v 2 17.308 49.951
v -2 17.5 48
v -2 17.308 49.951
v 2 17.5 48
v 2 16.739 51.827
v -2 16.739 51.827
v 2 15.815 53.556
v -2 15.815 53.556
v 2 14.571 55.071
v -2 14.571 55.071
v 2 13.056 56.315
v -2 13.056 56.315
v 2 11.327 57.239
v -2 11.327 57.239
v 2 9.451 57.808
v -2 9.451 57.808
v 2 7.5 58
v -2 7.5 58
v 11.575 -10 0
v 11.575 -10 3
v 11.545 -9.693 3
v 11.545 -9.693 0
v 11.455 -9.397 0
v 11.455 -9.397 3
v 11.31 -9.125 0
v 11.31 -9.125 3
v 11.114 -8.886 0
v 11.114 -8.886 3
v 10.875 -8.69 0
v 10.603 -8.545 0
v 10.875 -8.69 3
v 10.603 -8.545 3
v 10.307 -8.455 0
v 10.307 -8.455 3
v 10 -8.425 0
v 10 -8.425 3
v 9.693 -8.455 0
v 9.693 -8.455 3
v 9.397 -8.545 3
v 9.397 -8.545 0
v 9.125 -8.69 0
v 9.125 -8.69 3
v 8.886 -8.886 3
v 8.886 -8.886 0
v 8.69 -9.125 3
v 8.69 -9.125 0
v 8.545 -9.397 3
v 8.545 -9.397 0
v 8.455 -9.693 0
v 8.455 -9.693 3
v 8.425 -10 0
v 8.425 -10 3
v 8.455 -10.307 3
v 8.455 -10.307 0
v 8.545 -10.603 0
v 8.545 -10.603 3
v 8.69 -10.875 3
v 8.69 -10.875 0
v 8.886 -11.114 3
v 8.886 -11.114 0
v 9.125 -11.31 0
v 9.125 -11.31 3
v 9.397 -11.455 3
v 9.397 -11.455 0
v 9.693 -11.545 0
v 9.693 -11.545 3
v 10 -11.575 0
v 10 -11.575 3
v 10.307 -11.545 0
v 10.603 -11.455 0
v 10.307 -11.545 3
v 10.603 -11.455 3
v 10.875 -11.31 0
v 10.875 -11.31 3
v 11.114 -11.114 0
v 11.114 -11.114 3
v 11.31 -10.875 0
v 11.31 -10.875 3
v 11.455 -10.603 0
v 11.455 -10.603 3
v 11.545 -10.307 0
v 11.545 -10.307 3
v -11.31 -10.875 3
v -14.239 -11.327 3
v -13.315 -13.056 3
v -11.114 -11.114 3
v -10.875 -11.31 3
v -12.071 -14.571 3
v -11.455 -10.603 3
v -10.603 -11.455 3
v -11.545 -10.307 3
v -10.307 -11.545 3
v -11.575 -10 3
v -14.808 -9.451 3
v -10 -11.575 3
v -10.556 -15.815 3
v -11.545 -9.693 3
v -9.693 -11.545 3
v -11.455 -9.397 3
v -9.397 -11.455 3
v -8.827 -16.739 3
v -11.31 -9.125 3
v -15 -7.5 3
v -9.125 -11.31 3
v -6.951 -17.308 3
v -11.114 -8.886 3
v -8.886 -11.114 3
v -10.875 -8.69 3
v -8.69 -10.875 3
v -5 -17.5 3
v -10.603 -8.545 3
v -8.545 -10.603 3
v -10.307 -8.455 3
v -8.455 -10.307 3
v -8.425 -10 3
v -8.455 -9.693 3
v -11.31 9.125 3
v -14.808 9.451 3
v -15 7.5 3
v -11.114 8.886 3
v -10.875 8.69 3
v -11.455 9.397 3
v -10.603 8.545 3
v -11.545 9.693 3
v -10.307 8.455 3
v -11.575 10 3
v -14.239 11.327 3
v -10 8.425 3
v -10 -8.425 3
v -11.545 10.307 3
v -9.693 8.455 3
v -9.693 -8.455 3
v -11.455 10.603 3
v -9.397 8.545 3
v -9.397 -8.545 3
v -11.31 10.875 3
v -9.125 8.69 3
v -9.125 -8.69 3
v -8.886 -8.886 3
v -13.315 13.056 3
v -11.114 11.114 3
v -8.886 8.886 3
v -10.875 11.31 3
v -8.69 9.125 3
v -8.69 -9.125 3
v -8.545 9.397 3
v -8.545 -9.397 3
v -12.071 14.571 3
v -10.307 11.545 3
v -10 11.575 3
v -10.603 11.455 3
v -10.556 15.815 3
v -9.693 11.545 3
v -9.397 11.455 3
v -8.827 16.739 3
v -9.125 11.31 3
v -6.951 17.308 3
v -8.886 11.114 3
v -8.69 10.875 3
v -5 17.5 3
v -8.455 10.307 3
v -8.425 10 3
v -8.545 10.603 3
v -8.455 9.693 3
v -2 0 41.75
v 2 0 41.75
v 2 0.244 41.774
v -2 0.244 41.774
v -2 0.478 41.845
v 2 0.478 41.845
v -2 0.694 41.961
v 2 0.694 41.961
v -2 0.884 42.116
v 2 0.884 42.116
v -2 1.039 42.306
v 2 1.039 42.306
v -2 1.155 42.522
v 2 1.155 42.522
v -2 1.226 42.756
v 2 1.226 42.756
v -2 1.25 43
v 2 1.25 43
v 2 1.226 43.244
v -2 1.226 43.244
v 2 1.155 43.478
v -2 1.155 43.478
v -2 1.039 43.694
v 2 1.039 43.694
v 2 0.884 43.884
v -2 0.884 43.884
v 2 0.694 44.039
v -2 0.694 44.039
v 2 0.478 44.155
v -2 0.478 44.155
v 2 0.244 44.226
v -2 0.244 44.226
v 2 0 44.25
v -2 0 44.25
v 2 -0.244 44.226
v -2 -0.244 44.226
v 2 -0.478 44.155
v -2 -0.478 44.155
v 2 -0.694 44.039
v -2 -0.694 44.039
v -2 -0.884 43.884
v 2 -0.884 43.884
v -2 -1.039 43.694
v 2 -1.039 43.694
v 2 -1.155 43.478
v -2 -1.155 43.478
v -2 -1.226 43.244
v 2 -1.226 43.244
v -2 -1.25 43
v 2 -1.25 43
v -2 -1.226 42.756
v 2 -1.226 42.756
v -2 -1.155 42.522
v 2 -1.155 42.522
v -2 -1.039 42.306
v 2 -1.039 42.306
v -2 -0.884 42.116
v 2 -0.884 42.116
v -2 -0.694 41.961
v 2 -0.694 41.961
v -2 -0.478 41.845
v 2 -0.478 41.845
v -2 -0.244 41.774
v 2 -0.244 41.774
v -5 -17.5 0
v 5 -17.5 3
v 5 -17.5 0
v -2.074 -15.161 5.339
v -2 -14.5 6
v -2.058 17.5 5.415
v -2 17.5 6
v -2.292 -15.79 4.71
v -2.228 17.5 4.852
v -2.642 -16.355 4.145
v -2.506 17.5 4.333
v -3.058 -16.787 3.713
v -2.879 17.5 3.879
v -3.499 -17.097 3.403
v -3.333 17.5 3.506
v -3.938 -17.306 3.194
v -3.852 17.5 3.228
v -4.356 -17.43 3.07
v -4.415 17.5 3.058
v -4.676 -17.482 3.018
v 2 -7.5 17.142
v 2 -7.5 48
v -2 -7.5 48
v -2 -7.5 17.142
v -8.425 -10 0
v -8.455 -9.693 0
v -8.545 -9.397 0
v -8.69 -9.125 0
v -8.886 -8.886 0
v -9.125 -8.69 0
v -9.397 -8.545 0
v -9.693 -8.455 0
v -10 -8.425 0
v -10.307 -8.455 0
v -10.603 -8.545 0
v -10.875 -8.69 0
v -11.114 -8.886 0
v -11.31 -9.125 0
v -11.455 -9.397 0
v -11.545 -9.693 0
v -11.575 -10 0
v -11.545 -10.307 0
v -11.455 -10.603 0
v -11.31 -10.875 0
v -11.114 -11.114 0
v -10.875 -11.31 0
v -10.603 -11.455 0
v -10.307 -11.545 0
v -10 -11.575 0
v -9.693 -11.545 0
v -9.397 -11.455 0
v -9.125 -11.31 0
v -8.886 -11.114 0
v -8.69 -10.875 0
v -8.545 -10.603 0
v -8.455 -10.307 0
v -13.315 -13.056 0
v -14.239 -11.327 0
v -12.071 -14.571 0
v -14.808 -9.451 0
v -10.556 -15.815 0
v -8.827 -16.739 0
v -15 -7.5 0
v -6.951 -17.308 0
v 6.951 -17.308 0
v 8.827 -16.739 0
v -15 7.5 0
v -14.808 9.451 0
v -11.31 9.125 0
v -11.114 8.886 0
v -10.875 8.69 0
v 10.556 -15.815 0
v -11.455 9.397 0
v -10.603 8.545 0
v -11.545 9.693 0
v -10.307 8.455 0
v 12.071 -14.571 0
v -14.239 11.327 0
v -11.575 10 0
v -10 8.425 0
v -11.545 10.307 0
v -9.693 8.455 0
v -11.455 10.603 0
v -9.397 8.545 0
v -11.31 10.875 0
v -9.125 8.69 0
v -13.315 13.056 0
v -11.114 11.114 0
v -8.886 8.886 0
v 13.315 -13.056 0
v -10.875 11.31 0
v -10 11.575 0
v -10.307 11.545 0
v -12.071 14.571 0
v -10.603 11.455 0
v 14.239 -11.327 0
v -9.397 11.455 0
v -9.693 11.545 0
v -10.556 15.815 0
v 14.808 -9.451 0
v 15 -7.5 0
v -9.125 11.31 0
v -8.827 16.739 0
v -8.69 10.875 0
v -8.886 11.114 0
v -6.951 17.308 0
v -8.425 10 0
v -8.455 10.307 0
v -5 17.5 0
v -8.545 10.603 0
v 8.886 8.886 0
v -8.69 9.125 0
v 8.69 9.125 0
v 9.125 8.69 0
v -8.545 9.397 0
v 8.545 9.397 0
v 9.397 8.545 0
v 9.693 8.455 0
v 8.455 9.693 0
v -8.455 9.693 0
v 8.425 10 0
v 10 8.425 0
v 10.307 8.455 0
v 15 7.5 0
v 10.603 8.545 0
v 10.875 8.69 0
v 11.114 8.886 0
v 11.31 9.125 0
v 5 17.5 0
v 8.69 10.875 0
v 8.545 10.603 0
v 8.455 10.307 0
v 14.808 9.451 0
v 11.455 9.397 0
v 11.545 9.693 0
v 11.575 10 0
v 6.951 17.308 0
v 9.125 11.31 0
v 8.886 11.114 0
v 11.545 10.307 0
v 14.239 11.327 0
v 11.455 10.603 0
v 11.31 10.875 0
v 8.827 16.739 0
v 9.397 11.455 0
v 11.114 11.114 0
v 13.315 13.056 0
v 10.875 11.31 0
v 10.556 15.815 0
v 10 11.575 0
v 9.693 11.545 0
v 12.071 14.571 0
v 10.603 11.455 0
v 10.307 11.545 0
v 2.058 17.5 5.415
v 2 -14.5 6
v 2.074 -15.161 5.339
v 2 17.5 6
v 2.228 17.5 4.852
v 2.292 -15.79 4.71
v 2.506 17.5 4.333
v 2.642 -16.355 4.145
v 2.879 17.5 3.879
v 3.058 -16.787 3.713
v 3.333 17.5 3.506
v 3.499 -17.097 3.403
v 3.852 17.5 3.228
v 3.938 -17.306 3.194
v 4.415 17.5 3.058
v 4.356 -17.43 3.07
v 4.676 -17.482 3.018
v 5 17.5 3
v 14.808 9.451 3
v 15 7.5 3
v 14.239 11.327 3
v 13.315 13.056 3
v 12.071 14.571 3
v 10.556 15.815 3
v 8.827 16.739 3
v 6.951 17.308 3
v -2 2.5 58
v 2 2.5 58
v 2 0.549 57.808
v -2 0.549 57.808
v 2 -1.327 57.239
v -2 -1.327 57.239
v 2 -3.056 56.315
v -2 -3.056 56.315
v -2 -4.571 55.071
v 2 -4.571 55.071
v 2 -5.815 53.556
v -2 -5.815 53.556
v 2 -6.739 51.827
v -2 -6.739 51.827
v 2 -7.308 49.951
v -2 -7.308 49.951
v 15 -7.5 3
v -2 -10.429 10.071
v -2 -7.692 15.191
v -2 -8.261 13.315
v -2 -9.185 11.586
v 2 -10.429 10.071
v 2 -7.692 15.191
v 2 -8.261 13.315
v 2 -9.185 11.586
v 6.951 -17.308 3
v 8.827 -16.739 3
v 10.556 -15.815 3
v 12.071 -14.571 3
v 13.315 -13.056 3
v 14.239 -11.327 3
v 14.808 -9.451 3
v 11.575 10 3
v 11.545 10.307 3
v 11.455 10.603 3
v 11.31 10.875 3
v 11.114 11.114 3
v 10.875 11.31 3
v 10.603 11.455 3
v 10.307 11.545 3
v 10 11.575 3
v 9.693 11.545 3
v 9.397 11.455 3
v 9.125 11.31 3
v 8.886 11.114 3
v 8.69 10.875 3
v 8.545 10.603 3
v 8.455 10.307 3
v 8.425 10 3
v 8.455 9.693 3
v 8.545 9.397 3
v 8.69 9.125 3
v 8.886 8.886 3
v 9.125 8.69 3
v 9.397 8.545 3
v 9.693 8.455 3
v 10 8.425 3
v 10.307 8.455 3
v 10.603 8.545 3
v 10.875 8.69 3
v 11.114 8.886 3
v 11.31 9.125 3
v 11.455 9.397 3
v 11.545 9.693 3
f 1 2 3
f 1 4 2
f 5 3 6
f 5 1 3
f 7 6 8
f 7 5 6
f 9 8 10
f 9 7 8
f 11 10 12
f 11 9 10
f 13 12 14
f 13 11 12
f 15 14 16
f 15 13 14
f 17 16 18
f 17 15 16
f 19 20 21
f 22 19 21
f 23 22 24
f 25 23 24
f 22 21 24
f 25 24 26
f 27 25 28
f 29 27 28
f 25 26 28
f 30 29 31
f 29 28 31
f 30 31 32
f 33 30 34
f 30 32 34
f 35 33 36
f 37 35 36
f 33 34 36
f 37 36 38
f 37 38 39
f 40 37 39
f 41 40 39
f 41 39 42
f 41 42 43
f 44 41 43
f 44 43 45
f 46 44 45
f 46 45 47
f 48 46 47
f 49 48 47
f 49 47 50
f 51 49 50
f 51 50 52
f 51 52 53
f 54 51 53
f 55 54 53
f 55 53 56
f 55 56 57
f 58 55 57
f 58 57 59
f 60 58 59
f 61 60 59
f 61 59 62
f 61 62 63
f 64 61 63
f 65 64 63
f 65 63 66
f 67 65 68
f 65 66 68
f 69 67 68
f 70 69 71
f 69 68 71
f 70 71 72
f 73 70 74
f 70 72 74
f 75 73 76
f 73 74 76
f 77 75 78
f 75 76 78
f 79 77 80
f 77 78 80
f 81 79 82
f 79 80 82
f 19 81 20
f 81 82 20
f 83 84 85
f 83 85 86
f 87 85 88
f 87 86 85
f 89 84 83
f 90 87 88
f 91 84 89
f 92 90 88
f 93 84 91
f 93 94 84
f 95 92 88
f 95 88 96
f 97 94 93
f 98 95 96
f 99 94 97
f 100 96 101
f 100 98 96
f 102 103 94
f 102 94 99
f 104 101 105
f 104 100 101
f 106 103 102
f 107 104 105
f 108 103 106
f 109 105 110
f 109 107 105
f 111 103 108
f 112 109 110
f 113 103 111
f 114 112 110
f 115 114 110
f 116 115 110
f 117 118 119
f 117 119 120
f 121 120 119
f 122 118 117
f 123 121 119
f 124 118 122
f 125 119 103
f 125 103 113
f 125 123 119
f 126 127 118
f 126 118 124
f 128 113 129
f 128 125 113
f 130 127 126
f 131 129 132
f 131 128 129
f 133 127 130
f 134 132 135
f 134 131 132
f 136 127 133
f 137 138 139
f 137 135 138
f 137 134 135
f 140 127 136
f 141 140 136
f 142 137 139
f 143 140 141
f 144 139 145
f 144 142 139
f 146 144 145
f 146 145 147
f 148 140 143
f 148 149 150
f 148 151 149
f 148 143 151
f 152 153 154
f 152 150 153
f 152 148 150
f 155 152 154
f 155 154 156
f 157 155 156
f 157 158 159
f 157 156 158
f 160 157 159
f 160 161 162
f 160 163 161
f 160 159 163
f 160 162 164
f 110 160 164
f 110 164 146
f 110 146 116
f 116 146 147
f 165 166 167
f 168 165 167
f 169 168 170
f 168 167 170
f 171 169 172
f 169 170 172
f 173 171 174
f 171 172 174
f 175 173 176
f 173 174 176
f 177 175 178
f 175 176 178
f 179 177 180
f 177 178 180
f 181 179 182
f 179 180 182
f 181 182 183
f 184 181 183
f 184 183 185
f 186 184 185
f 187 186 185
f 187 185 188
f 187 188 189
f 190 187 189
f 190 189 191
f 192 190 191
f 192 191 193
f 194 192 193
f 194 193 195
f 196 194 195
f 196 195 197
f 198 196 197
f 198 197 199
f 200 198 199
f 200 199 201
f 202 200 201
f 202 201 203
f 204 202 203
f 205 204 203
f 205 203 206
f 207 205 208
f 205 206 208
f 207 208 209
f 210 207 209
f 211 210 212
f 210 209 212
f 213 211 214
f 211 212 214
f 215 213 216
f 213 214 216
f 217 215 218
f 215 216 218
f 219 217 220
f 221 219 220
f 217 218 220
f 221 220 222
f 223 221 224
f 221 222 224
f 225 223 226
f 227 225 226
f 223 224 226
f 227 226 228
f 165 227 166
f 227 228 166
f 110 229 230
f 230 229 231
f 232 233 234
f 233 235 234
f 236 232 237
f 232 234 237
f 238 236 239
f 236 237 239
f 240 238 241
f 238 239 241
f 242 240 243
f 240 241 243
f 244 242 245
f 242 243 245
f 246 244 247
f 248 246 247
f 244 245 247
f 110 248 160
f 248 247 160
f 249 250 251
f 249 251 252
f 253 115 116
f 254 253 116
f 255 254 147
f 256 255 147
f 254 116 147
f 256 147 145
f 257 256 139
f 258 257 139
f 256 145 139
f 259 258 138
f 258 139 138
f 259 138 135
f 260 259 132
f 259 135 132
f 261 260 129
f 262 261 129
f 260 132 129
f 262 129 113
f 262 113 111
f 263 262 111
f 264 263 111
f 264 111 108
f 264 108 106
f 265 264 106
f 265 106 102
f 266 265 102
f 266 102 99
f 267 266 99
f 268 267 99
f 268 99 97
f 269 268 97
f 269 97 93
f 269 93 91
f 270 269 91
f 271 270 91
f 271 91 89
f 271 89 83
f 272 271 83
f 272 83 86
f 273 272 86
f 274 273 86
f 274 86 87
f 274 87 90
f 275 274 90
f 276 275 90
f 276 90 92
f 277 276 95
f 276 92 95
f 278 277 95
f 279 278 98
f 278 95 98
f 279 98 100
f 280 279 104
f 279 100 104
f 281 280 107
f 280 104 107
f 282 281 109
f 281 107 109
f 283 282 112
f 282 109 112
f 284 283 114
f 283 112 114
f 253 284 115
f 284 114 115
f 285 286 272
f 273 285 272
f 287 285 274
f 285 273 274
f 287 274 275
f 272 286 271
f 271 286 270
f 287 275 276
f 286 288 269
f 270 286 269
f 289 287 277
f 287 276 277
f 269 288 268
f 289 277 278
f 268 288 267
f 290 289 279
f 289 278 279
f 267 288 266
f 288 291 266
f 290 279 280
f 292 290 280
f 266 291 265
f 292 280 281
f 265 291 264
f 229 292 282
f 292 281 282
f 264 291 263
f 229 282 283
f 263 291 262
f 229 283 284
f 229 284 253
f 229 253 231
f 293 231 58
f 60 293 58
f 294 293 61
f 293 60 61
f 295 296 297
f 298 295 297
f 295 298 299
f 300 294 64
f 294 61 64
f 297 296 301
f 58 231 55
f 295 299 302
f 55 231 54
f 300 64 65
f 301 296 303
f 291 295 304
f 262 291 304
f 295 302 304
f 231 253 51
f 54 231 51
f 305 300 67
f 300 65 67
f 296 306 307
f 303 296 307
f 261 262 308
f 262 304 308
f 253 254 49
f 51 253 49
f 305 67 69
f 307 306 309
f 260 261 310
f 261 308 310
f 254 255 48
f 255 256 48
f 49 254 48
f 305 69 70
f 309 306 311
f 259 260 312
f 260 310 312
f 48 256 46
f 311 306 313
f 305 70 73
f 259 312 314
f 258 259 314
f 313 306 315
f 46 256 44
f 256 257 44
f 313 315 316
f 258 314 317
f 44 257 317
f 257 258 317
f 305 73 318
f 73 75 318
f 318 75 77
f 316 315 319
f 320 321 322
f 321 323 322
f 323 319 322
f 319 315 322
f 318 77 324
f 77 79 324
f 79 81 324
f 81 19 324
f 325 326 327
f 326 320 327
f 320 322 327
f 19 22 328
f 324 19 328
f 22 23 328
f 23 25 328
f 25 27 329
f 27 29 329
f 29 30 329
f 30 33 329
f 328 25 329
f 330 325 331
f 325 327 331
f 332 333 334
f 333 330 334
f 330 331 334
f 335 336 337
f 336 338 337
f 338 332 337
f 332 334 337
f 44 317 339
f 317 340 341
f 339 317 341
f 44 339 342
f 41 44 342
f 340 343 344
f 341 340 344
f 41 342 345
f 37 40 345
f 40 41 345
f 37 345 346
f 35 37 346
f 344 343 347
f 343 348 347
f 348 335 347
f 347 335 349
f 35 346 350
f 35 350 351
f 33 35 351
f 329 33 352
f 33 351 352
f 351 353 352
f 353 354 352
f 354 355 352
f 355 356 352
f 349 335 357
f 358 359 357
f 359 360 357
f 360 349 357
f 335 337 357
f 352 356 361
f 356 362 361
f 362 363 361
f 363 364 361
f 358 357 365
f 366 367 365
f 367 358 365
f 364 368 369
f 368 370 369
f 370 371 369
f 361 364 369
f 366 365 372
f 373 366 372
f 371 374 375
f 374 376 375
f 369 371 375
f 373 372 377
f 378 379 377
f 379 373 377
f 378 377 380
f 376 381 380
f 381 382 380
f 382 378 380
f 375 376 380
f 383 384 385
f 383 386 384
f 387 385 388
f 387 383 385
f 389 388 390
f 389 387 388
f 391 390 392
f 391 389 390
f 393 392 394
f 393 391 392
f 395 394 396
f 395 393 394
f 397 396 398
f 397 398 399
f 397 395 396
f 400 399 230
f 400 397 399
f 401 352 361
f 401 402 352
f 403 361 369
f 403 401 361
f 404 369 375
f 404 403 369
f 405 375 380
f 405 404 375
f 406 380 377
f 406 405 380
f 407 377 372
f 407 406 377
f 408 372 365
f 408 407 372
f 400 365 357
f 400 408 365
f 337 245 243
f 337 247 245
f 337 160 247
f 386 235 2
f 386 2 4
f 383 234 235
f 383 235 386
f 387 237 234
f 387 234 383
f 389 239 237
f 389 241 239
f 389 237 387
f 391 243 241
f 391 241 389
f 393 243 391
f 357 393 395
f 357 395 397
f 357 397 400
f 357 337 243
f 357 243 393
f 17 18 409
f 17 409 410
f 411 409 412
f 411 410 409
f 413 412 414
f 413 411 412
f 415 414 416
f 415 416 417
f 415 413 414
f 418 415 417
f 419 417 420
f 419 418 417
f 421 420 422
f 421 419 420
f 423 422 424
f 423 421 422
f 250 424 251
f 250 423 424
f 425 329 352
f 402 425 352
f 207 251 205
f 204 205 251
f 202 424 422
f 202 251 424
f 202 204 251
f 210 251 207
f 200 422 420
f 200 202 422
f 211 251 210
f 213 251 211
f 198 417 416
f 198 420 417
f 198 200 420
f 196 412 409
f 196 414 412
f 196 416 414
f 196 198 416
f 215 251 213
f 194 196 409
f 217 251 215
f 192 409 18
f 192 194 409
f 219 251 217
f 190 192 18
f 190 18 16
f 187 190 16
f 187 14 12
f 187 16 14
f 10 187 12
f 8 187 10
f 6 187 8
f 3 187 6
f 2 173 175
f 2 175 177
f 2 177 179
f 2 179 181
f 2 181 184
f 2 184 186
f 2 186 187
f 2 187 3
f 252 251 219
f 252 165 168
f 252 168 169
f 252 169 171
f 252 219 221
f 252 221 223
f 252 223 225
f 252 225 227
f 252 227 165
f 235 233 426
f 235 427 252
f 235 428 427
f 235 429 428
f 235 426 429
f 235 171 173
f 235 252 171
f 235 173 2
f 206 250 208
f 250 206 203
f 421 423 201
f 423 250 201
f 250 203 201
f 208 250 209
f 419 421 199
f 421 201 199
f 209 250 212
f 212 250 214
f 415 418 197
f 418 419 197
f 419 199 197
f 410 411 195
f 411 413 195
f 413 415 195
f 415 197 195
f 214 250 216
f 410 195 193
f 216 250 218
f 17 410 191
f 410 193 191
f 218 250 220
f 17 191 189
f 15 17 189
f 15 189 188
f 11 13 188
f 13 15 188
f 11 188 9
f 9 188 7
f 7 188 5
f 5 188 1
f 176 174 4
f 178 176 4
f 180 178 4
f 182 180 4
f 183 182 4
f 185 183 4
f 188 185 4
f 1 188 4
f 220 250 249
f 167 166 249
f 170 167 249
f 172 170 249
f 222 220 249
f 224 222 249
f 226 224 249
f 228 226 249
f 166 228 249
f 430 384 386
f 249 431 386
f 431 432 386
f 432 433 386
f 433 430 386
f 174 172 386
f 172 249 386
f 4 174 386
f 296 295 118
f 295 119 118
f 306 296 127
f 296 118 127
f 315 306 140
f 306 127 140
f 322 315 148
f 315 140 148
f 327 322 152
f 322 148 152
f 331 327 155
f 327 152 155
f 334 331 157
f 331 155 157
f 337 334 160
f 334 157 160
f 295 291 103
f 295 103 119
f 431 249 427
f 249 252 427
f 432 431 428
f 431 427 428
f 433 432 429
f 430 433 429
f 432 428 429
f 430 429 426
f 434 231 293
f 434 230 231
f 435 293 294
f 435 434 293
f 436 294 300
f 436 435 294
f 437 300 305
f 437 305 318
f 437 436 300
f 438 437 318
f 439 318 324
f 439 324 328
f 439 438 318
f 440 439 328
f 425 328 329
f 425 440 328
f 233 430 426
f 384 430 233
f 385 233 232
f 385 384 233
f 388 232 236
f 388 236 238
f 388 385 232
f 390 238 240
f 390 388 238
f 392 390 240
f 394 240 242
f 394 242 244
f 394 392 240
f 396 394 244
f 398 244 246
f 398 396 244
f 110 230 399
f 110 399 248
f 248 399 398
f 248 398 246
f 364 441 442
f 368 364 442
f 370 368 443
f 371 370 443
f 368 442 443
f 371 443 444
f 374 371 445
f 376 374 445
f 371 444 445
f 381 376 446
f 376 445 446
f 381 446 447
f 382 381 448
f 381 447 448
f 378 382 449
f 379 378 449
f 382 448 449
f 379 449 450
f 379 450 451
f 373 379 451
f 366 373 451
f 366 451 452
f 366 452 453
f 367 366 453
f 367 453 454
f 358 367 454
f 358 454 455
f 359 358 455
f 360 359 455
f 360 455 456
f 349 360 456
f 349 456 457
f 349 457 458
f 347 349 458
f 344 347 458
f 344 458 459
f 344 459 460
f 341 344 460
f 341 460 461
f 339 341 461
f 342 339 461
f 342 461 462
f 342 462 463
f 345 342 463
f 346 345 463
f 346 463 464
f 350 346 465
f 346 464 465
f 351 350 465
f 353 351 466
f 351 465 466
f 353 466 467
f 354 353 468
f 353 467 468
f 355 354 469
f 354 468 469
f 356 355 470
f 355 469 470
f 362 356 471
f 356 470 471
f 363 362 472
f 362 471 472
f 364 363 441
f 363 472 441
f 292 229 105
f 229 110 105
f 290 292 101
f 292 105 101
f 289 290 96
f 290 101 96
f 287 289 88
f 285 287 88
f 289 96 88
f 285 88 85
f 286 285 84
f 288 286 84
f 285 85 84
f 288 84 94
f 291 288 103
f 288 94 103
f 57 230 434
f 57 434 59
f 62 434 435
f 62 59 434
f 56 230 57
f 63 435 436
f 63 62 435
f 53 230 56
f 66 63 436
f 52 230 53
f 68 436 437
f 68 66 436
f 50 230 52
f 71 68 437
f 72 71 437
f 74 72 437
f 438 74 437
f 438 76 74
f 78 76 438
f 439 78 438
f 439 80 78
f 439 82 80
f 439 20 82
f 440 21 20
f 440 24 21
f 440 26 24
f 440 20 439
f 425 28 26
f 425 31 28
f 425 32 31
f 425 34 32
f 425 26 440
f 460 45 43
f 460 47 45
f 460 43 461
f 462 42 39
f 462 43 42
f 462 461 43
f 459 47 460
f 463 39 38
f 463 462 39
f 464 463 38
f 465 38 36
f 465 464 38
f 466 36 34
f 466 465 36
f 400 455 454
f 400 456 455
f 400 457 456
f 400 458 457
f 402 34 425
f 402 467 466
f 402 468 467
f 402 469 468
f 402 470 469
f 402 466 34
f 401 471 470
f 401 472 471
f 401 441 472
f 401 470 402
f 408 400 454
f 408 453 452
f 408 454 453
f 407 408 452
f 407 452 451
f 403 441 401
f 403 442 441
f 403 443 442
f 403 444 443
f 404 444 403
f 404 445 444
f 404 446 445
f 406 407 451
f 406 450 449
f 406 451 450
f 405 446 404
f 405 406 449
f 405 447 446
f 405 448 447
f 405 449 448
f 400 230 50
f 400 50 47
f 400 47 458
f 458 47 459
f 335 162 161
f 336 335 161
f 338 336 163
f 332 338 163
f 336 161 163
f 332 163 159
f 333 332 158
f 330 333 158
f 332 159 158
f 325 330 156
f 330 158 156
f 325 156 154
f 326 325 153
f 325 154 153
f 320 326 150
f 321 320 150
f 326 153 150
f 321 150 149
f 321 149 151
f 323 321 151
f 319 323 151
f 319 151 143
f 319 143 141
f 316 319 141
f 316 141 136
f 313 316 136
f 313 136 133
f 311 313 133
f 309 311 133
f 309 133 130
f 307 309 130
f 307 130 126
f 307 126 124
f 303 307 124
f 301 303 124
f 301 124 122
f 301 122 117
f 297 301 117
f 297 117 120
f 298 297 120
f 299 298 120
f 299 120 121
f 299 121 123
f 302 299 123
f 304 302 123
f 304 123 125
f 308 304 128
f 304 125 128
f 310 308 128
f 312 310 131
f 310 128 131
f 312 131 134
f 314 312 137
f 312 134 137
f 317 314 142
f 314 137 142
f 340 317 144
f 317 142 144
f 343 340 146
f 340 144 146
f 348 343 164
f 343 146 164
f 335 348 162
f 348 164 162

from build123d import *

# Parameters (mm, degrees)
SKETCH1_W           = 30
SKETCH1_H           = 35
BOSS_EXTRUDE1_DEPTH = 3
SKETCH2_W           = 4
SKETCH2_H           = 35
BOSS_EXTRUDE2_DEPTH = 55
FILLET1_R           = 10
FILLET2_R           = 10
SKETCH3_R           = 1.575
CUT_EXTRUDE1_DEPTH  = 55
SKETCH4_R           = 1.25
CUT_EXTRUDE2_DEPTH  = 55
SKETCH5_W           = 53.614570856
SKETCH5_H           = 10
CUT_EXTRUDE3_DEPTH  = 55
FILLET3_R           = 10
CUT_EXTRUDE4_DEPTH  = 55
FILLET4_R           = 10
FILLET5_R           = 3


with BuildPart() as part:
    # Sketch1 → Boss-Extrude1 (new body)
    with BuildSketch(Plane.XY):
        Rectangle(SKETCH1_W, SKETCH1_H)
    extrude(amount=BOSS_EXTRUDE1_DEPTH)

    # Sketch2 → Boss-Extrude2 (add)
    with BuildSketch(Plane.XY.offset(3)):
        Rectangle(SKETCH2_W, SKETCH2_H)
    extrude(amount=BOSS_EXTRUDE2_DEPTH)

    # Fillet1
    fillet1_edges = [part.edges().sort_by_distance(p)[0] for p in [
        (0, 17.5, 58),
        (0, -17.5, 58),
    ]]
    fillet(fillet1_edges, radius=FILLET1_R)

    # Fillet2
    fillet2_edges = [part.edges().sort_by_distance(p)[0] for p in [
        (15, -17.5, 1.5),
        (-15, -17.5, 1.5),
        (-15, 17.5, 1.5),
        (15, 17.5, 1.5),
    ]]
    fillet(fillet2_edges, radius=FILLET2_R)

    # Sketch3 → Cut-Extrude1 (cut)
    with BuildSketch(Plane.XY.offset(3)):
        with Locations((-10, 10)):
            Circle(SKETCH3_R)
        with Locations((10, -10)):
            Circle(SKETCH3_R)
        with Locations((10, 10)):
            Circle(SKETCH3_R)
        with Locations((-10, -10)):
            Circle(SKETCH3_R)
    extrude(amount=-CUT_EXTRUDE1_DEPTH, mode=Mode.SUBTRACT)

    # Sketch4 → Cut-Extrude2 (cut)
    with BuildSketch(Plane(origin=(2, 0, 0), x_dir=(0, 0, -1), z_dir=(1, 0, 0))):
        with Locations((-43, 0)):
            Circle(SKETCH4_R)
    extrude(amount=-CUT_EXTRUDE2_DEPTH, mode=Mode.SUBTRACT)

    # Sketch5 → Cut-Extrude3 (cut)
    with BuildSketch(Plane(origin=(2, 0, 0), x_dir=(0, 0, -1), z_dir=(1, 0, 0))):
        with Locations((-39.807285428, -12.5)):
            Rectangle(SKETCH5_W, SKETCH5_H)
    extrude(amount=-CUT_EXTRUDE3_DEPTH, mode=Mode.SUBTRACT)

    # Fillet3
    fillet3_edges = [part.edges().sort_by_distance(p)[0] for p in [
        (0, -7.5, 58),
    ]]
    fillet(fillet3_edges, radius=FILLET3_R)

    # Sketch6 → Cut-Extrude4 (cut)
    with BuildSketch(Plane(origin=(2, 0, 0), x_dir=(0, 0, -1), z_dir=(1, 0, 0))):
        Polygon((-13, -7.5), (-3, -17.5), (-13, -17.5), align=None)
    extrude(amount=-CUT_EXTRUDE4_DEPTH, mode=Mode.SUBTRACT)

    # Fillet4
    fillet4_edges = [part.edges().sort_by_distance(p)[0] for p in [
        (0, -7.5, 13),
    ]]
    fillet(fillet4_edges, radius=FILLET4_R)

    # Fillet5
    fillet5_edges = [part.edges().sort_by_distance(p)[0] for p in [
        (2, 0, 3),
        (-2, 0, 3),
    ]]
    fillet(fillet5_edges, radius=FILLET5_R - 0.0001)  # a hair under: the kernel refuses the full size


solid = part.part
